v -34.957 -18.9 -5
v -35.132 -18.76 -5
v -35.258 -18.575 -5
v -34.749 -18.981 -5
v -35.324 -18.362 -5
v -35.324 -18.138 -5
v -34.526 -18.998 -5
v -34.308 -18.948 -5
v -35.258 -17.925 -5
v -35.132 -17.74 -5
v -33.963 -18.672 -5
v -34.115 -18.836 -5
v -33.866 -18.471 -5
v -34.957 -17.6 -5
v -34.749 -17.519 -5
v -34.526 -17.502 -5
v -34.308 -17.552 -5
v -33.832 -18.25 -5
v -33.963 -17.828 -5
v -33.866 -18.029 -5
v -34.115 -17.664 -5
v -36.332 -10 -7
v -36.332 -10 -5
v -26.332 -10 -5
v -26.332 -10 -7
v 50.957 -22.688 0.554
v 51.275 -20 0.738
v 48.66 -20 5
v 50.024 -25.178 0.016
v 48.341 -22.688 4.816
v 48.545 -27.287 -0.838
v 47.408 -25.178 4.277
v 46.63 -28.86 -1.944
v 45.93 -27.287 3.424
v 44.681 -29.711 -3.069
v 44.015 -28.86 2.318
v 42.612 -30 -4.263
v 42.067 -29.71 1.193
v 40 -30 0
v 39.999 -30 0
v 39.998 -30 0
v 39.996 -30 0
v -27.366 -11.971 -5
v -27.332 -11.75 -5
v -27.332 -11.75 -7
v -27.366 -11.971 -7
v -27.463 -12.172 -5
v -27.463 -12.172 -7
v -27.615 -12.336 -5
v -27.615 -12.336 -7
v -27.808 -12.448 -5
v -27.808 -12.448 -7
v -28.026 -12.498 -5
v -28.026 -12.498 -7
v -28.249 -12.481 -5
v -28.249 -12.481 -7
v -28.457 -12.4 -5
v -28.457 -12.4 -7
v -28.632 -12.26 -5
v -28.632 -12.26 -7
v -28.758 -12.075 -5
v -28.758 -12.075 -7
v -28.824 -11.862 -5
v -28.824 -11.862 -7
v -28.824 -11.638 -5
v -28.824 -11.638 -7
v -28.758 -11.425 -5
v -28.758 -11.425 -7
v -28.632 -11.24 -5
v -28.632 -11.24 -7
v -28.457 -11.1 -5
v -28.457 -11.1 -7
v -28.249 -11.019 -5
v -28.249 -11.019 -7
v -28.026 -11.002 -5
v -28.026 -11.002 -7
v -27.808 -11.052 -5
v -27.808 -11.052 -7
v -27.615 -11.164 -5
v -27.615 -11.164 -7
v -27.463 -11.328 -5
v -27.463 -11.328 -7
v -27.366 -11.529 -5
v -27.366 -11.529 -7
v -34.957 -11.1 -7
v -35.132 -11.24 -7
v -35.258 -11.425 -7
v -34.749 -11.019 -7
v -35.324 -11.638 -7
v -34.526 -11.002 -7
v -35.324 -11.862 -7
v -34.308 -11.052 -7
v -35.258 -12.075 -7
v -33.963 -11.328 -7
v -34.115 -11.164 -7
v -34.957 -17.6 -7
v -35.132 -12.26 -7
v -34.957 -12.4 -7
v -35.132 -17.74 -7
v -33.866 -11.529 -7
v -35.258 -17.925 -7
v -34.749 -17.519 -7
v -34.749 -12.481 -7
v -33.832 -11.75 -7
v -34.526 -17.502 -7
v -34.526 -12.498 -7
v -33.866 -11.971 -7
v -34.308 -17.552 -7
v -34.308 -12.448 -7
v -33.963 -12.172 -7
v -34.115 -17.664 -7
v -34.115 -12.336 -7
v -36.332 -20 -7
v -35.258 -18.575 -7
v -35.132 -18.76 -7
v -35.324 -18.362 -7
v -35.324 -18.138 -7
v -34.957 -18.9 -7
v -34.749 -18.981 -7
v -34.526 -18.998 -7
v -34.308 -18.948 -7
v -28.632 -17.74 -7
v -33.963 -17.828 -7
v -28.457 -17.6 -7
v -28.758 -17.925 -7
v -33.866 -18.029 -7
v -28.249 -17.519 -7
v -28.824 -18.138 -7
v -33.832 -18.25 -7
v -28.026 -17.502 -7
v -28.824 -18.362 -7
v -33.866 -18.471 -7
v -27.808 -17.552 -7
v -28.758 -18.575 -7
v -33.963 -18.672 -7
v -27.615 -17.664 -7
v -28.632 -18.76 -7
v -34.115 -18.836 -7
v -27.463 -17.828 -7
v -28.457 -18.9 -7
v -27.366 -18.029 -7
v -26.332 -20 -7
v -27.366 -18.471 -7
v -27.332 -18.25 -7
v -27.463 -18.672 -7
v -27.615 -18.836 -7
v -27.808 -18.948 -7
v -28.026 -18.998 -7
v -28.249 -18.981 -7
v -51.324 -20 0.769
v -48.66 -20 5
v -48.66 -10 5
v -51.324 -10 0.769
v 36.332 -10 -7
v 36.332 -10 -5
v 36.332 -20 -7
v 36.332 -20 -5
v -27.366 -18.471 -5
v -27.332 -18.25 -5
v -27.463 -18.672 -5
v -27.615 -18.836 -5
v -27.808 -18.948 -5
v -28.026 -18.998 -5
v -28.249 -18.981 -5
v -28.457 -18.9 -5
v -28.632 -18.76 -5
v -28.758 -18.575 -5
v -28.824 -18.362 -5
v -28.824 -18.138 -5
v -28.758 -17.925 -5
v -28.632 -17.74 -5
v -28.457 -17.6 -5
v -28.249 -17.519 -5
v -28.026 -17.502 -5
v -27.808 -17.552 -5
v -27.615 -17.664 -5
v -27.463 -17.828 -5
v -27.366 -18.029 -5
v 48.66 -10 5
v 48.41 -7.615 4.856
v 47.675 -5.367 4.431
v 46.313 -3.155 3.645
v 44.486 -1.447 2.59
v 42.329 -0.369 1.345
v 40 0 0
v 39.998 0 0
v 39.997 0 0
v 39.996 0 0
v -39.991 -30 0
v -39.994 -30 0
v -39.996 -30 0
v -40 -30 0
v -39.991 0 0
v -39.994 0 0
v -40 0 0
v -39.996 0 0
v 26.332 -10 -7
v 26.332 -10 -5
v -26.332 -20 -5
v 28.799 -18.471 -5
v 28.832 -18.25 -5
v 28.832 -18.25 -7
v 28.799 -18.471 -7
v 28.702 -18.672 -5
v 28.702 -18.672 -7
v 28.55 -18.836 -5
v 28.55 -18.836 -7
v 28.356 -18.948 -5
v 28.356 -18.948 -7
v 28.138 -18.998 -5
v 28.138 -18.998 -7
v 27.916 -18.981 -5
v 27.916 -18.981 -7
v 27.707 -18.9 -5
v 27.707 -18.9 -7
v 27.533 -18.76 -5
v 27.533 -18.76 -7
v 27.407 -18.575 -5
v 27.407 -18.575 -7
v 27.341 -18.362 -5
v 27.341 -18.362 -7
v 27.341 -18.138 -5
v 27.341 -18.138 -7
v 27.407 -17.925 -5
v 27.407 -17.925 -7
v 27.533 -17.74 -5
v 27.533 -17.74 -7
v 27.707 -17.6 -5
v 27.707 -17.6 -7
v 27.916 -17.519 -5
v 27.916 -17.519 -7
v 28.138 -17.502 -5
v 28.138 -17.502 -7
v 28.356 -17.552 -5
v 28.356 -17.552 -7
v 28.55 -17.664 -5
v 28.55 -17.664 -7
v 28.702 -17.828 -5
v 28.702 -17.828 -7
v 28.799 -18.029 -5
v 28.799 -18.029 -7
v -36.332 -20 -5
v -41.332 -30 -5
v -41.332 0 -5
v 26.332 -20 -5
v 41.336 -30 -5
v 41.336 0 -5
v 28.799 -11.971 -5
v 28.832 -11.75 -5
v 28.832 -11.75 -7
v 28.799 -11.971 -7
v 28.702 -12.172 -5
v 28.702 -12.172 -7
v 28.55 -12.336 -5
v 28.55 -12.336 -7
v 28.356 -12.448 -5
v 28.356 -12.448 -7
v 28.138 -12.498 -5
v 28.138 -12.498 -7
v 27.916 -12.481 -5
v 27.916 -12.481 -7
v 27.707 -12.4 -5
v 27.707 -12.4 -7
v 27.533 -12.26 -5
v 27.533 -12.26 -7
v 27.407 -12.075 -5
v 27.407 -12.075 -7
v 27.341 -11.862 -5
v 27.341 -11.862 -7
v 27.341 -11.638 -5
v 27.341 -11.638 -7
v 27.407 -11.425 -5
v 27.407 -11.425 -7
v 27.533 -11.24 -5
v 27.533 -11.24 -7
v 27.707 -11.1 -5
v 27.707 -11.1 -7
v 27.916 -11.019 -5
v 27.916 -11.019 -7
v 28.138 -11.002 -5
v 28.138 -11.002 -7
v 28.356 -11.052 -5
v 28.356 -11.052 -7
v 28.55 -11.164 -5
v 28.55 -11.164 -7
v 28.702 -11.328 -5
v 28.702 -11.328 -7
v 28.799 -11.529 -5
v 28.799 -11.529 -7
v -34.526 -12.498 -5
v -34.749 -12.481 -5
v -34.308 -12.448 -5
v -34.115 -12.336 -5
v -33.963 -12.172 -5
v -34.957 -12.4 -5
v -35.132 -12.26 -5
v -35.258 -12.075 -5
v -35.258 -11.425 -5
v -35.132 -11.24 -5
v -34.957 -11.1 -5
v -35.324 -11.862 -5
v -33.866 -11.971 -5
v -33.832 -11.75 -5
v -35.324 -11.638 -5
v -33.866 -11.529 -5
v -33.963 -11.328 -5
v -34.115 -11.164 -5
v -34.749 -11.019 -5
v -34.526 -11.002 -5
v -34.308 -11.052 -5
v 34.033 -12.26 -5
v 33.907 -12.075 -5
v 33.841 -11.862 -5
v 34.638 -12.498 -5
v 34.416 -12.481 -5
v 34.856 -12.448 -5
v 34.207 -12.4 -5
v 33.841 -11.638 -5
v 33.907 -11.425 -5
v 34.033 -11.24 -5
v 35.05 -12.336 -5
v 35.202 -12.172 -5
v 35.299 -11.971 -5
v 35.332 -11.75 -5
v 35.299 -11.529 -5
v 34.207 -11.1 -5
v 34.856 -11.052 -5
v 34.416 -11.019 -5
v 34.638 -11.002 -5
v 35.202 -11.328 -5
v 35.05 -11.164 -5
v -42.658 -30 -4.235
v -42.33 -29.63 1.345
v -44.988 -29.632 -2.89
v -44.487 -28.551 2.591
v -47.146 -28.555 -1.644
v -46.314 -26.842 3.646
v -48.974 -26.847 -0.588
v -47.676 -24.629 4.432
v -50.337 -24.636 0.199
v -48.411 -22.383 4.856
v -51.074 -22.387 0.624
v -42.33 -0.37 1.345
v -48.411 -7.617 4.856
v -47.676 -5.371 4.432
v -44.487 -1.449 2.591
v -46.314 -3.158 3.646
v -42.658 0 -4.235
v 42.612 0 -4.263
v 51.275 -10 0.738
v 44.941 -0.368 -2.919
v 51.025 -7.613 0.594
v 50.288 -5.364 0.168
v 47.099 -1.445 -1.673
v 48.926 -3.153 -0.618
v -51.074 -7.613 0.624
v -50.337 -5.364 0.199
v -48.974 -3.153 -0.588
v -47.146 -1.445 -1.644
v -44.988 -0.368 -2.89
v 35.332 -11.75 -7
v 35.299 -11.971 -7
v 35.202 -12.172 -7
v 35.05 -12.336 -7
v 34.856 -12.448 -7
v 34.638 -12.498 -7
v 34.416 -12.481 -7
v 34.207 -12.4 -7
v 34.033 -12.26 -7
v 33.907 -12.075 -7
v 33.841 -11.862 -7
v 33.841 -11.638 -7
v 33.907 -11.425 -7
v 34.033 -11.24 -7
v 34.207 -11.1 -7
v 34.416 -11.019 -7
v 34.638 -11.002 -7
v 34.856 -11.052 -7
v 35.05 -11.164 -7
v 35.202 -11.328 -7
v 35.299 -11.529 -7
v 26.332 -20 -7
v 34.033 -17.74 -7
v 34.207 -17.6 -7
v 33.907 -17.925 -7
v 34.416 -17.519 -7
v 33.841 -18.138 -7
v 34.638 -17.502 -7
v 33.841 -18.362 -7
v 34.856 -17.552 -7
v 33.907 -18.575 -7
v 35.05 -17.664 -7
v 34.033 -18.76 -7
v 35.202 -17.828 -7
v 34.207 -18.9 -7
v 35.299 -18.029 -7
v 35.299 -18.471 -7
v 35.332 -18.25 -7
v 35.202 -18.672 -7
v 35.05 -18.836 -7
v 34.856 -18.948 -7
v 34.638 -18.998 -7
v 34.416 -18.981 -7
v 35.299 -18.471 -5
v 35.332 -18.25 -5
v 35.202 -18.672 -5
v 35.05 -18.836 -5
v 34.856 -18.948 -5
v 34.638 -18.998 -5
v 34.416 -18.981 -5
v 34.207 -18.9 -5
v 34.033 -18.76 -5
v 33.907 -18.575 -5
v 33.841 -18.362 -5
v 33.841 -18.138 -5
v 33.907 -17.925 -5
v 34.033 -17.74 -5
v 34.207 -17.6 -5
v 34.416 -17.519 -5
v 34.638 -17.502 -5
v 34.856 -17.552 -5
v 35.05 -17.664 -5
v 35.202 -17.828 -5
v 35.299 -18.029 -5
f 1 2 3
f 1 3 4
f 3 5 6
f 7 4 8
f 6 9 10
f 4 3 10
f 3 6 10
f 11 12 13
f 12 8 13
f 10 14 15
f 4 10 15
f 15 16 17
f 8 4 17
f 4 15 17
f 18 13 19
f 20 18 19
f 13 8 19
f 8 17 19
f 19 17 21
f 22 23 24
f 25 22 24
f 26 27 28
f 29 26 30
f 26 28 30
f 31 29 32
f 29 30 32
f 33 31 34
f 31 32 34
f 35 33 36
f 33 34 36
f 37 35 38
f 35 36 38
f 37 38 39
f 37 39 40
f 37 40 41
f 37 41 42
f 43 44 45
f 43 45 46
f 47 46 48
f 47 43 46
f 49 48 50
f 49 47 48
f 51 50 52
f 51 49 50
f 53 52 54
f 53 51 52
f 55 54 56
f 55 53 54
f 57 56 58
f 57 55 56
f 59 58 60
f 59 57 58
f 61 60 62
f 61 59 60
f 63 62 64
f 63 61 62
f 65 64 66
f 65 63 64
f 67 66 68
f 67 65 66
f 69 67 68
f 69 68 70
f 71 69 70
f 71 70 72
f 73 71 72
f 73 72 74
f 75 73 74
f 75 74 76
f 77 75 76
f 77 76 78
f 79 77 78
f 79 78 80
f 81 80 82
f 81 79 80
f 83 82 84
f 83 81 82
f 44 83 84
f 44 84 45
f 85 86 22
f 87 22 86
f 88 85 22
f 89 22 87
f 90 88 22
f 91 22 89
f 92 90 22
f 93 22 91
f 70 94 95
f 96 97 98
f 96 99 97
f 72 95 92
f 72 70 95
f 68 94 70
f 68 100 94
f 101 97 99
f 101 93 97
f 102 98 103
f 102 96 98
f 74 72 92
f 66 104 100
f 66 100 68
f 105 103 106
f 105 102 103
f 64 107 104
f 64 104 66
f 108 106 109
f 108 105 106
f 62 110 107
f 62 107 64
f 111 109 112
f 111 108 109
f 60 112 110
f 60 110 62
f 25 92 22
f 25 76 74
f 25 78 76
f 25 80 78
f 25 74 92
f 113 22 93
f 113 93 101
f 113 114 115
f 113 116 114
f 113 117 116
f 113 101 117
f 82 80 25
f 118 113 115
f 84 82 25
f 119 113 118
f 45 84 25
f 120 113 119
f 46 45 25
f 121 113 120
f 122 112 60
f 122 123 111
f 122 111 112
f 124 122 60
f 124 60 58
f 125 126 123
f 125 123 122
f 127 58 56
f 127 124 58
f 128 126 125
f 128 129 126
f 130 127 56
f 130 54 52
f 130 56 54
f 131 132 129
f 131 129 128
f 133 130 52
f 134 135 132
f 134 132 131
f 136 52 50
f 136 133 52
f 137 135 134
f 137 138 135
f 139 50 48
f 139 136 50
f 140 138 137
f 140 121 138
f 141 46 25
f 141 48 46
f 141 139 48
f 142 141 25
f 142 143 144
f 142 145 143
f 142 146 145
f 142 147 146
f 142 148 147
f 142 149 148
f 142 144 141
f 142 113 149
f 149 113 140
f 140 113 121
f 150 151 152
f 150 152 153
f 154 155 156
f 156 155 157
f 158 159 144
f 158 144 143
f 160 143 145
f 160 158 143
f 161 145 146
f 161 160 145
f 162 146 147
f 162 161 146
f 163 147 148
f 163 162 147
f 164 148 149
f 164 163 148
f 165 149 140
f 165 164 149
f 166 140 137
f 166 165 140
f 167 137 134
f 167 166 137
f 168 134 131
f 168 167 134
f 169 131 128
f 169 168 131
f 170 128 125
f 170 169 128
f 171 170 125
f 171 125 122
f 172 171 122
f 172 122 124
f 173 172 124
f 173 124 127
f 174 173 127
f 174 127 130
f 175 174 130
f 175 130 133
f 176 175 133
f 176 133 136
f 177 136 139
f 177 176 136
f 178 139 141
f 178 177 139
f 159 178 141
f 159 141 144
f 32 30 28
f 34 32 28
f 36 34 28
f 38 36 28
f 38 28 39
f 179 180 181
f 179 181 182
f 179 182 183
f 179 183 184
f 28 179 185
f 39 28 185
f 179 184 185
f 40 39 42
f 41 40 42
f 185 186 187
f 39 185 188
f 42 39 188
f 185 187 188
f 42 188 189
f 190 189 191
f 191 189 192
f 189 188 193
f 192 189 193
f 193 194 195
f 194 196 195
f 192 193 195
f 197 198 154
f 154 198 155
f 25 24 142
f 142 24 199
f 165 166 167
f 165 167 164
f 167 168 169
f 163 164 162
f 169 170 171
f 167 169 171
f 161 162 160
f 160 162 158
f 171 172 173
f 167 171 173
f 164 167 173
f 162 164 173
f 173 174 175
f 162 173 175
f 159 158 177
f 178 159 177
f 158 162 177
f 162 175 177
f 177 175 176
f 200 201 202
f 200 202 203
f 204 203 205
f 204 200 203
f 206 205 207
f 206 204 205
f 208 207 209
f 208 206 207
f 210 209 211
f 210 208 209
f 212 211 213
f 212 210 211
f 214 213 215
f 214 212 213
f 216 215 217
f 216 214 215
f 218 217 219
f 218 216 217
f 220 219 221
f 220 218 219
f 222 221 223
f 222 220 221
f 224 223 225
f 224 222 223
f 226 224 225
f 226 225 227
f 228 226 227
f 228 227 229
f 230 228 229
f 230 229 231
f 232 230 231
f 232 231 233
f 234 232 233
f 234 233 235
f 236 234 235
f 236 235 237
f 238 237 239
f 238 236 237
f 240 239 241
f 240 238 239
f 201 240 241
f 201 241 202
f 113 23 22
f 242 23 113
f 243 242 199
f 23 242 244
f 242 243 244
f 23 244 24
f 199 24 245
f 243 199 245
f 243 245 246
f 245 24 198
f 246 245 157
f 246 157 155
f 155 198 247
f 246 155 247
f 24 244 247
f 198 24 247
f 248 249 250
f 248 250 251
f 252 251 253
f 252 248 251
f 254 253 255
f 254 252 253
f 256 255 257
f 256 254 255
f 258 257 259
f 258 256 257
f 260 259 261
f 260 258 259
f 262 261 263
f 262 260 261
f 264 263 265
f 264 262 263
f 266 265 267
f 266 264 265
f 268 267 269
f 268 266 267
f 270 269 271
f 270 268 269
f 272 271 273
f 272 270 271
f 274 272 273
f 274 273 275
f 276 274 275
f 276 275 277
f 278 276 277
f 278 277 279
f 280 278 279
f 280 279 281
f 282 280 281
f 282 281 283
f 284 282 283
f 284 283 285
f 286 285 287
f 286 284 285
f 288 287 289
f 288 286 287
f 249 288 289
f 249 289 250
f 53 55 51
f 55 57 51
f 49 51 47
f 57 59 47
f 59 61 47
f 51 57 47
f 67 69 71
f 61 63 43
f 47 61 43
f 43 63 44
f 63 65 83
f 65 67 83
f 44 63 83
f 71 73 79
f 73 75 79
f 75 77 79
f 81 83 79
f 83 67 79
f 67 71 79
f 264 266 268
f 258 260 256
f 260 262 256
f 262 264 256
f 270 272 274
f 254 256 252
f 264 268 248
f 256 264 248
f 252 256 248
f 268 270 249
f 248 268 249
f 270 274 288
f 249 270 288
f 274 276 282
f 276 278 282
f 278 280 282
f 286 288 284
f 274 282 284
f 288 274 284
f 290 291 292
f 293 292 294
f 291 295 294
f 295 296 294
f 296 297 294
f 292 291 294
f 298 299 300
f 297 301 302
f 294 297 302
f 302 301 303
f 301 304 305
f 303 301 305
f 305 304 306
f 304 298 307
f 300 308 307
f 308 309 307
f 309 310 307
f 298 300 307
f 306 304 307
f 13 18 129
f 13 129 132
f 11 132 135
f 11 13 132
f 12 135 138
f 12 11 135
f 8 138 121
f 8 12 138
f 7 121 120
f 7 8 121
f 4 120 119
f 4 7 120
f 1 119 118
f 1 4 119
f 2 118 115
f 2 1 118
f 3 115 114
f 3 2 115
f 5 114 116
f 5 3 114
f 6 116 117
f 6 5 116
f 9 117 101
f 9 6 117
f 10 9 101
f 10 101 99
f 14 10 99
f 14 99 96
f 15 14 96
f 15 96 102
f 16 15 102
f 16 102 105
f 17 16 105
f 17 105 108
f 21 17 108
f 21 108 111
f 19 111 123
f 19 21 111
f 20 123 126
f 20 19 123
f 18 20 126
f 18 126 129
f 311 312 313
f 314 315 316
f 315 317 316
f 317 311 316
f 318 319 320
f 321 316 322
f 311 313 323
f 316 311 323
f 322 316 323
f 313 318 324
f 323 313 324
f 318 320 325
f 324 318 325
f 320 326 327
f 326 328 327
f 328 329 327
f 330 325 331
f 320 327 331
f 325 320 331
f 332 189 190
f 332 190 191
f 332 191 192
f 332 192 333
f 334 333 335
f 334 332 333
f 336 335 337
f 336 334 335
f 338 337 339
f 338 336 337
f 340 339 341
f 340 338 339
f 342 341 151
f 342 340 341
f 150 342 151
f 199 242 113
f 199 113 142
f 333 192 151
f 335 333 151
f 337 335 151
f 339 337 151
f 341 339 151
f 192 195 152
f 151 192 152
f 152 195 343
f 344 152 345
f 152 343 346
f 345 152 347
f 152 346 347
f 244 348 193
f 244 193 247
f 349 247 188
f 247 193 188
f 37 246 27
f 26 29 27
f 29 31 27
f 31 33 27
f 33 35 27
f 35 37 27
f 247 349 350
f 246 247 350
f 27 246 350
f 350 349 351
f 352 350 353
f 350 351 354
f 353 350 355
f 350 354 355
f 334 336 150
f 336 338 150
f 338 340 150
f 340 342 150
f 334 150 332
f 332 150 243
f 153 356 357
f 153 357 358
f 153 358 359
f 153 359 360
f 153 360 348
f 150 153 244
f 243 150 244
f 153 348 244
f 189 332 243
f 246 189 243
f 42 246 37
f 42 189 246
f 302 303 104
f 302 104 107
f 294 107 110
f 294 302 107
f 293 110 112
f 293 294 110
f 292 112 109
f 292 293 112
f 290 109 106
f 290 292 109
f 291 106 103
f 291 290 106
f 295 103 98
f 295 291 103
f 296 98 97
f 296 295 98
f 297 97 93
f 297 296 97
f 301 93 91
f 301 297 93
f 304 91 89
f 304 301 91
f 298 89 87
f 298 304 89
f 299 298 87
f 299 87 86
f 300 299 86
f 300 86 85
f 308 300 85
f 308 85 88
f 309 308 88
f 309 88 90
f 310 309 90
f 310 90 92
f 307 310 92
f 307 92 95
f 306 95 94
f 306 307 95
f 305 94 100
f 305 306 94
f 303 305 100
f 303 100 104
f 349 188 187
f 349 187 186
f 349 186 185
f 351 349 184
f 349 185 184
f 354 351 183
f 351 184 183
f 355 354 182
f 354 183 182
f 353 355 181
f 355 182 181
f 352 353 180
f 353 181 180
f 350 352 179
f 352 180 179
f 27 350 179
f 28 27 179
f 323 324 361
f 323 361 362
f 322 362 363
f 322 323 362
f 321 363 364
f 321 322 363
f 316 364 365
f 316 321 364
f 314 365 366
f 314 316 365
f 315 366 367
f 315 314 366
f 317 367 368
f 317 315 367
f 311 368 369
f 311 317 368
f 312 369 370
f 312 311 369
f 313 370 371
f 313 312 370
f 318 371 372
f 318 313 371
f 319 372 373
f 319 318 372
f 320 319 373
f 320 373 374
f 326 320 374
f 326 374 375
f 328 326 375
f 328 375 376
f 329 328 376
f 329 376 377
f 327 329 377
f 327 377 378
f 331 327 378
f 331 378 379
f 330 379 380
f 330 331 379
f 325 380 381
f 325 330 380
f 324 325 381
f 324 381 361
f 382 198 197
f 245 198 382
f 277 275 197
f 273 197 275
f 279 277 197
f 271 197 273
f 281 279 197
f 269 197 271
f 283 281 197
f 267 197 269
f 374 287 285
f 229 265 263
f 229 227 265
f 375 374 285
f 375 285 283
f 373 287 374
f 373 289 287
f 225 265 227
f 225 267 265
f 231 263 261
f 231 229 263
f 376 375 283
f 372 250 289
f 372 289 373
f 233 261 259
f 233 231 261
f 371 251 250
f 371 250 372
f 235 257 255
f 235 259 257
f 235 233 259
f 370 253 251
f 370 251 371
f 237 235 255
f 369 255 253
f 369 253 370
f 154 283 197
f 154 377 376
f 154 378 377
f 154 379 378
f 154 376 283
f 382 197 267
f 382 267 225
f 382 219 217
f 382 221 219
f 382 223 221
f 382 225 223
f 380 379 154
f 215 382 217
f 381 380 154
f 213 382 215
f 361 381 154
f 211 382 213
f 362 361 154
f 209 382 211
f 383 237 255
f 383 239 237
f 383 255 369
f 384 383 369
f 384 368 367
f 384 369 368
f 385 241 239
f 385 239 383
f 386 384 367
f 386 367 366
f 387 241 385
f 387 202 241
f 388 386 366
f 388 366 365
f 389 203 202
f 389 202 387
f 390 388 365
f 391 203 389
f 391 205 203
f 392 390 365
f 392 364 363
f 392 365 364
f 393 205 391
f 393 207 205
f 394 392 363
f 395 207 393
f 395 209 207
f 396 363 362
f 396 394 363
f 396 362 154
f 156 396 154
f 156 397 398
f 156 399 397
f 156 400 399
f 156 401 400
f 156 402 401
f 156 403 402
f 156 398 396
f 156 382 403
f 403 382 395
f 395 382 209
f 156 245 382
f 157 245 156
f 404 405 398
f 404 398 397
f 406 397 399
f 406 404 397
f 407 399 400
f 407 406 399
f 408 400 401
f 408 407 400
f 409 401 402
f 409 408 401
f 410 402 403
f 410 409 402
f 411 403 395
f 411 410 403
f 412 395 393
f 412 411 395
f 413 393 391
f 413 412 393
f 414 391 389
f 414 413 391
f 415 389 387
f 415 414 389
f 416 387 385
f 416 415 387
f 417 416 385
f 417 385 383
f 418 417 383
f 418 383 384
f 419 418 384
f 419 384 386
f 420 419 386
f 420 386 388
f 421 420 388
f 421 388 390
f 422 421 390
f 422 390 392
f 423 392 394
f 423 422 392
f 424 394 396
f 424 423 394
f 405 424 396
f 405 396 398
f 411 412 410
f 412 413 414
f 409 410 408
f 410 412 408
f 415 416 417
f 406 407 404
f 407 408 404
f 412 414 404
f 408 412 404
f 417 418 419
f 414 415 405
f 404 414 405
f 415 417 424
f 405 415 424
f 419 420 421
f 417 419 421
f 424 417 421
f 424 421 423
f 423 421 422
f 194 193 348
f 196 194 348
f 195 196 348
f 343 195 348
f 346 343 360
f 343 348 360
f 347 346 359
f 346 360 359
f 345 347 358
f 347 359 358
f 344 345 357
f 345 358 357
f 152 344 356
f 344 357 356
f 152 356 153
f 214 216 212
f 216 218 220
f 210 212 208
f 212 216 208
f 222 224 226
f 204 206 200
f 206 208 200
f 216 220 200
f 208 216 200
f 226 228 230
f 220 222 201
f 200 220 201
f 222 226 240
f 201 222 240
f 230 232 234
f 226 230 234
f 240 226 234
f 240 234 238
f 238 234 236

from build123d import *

# Parameters (mm, degrees)
F1_DEPTH = 30
F2_R     = 10
F3_R     = 10
F4_R     = 10
F5_R     = 10
F6_W     = 10
F6_H     = 10
F6_R     = 0.75
F7_DEPTH = 2


with BuildPart() as f1:
    # F0 (on Front) → F1 (new body)
    with BuildSketch(Plane.XZ):
        Polygon((40, 0), (0, 0), (-40, 0), (-48.660254, 5), (-51.324189, 0.768753), (-41.332416, -5), (41.336155, -5), (51.275389, 0.73842), (48.660254, 5), align=None)
    extrude(amount=F1_DEPTH)

    # F2
    f2_edges = [f1.edges().sort_by_distance(p)[0] for p in [
        (49.967822, -30, 2.86921),
    ]]
    fillet(f2_edges, radius=F2_R)

    # F3
    f3_edges = [f1.edges().sort_by_distance(p)[0] for p in [
        (49.967822, 0, 2.86921),
    ]]
    fillet(f3_edges, radius=F3_R)

    # F4
    f4_edges = [f1.edges().sort_by_distance(p)[0] for p in [
        (-49.992221, 0, 2.884377),
    ]]
    fillet(f4_edges, radius=F4_R)

    # F5
    f5_edges = [f1.edges().sort_by_distance(p)[0] for p in [
        (-49.992221, -30, 2.884377),
    ]]
    fillet(f5_edges, radius=F5_R)

    # F6 (on face) → F7 (join)
    with BuildSketch(Plane(origin=(0, 0, -5), x_dir=(1, 0, 0), z_dir=(0, 0, -1))):
        with Locations((31.332416, 15)):
            Rectangle(F6_W, F6_H)
        with Locations((28.082416, 11.75)):
            Circle(F6_R, mode=Mode.SUBTRACT)
        with Locations((34.582416, 11.75)):
            Circle(F6_R, mode=Mode.SUBTRACT)
        with Locations((28.082416, 18.25)):
            Circle(F6_R, mode=Mode.SUBTRACT)
        with Locations((34.582416, 18.25)):
            Circle(F6_R, mode=Mode.SUBTRACT)
        with Locations((-31.332416, 15)):
            Rectangle(F6_W, F6_H)
        with Locations((-34.582416, 11.75)):
            Circle(F6_R, mode=Mode.SUBTRACT)
        with Locations((-28.082416, 11.75)):
            Circle(F6_R, mode=Mode.SUBTRACT)
        with Locations((-34.582416, 18.25)):
            Circle(F6_R, mode=Mode.SUBTRACT)
        with Locations((-28.082416, 18.25)):
            Circle(F6_R, mode=Mode.SUBTRACT)
    extrude(amount=F7_DEPTH)


solid = f1.part
